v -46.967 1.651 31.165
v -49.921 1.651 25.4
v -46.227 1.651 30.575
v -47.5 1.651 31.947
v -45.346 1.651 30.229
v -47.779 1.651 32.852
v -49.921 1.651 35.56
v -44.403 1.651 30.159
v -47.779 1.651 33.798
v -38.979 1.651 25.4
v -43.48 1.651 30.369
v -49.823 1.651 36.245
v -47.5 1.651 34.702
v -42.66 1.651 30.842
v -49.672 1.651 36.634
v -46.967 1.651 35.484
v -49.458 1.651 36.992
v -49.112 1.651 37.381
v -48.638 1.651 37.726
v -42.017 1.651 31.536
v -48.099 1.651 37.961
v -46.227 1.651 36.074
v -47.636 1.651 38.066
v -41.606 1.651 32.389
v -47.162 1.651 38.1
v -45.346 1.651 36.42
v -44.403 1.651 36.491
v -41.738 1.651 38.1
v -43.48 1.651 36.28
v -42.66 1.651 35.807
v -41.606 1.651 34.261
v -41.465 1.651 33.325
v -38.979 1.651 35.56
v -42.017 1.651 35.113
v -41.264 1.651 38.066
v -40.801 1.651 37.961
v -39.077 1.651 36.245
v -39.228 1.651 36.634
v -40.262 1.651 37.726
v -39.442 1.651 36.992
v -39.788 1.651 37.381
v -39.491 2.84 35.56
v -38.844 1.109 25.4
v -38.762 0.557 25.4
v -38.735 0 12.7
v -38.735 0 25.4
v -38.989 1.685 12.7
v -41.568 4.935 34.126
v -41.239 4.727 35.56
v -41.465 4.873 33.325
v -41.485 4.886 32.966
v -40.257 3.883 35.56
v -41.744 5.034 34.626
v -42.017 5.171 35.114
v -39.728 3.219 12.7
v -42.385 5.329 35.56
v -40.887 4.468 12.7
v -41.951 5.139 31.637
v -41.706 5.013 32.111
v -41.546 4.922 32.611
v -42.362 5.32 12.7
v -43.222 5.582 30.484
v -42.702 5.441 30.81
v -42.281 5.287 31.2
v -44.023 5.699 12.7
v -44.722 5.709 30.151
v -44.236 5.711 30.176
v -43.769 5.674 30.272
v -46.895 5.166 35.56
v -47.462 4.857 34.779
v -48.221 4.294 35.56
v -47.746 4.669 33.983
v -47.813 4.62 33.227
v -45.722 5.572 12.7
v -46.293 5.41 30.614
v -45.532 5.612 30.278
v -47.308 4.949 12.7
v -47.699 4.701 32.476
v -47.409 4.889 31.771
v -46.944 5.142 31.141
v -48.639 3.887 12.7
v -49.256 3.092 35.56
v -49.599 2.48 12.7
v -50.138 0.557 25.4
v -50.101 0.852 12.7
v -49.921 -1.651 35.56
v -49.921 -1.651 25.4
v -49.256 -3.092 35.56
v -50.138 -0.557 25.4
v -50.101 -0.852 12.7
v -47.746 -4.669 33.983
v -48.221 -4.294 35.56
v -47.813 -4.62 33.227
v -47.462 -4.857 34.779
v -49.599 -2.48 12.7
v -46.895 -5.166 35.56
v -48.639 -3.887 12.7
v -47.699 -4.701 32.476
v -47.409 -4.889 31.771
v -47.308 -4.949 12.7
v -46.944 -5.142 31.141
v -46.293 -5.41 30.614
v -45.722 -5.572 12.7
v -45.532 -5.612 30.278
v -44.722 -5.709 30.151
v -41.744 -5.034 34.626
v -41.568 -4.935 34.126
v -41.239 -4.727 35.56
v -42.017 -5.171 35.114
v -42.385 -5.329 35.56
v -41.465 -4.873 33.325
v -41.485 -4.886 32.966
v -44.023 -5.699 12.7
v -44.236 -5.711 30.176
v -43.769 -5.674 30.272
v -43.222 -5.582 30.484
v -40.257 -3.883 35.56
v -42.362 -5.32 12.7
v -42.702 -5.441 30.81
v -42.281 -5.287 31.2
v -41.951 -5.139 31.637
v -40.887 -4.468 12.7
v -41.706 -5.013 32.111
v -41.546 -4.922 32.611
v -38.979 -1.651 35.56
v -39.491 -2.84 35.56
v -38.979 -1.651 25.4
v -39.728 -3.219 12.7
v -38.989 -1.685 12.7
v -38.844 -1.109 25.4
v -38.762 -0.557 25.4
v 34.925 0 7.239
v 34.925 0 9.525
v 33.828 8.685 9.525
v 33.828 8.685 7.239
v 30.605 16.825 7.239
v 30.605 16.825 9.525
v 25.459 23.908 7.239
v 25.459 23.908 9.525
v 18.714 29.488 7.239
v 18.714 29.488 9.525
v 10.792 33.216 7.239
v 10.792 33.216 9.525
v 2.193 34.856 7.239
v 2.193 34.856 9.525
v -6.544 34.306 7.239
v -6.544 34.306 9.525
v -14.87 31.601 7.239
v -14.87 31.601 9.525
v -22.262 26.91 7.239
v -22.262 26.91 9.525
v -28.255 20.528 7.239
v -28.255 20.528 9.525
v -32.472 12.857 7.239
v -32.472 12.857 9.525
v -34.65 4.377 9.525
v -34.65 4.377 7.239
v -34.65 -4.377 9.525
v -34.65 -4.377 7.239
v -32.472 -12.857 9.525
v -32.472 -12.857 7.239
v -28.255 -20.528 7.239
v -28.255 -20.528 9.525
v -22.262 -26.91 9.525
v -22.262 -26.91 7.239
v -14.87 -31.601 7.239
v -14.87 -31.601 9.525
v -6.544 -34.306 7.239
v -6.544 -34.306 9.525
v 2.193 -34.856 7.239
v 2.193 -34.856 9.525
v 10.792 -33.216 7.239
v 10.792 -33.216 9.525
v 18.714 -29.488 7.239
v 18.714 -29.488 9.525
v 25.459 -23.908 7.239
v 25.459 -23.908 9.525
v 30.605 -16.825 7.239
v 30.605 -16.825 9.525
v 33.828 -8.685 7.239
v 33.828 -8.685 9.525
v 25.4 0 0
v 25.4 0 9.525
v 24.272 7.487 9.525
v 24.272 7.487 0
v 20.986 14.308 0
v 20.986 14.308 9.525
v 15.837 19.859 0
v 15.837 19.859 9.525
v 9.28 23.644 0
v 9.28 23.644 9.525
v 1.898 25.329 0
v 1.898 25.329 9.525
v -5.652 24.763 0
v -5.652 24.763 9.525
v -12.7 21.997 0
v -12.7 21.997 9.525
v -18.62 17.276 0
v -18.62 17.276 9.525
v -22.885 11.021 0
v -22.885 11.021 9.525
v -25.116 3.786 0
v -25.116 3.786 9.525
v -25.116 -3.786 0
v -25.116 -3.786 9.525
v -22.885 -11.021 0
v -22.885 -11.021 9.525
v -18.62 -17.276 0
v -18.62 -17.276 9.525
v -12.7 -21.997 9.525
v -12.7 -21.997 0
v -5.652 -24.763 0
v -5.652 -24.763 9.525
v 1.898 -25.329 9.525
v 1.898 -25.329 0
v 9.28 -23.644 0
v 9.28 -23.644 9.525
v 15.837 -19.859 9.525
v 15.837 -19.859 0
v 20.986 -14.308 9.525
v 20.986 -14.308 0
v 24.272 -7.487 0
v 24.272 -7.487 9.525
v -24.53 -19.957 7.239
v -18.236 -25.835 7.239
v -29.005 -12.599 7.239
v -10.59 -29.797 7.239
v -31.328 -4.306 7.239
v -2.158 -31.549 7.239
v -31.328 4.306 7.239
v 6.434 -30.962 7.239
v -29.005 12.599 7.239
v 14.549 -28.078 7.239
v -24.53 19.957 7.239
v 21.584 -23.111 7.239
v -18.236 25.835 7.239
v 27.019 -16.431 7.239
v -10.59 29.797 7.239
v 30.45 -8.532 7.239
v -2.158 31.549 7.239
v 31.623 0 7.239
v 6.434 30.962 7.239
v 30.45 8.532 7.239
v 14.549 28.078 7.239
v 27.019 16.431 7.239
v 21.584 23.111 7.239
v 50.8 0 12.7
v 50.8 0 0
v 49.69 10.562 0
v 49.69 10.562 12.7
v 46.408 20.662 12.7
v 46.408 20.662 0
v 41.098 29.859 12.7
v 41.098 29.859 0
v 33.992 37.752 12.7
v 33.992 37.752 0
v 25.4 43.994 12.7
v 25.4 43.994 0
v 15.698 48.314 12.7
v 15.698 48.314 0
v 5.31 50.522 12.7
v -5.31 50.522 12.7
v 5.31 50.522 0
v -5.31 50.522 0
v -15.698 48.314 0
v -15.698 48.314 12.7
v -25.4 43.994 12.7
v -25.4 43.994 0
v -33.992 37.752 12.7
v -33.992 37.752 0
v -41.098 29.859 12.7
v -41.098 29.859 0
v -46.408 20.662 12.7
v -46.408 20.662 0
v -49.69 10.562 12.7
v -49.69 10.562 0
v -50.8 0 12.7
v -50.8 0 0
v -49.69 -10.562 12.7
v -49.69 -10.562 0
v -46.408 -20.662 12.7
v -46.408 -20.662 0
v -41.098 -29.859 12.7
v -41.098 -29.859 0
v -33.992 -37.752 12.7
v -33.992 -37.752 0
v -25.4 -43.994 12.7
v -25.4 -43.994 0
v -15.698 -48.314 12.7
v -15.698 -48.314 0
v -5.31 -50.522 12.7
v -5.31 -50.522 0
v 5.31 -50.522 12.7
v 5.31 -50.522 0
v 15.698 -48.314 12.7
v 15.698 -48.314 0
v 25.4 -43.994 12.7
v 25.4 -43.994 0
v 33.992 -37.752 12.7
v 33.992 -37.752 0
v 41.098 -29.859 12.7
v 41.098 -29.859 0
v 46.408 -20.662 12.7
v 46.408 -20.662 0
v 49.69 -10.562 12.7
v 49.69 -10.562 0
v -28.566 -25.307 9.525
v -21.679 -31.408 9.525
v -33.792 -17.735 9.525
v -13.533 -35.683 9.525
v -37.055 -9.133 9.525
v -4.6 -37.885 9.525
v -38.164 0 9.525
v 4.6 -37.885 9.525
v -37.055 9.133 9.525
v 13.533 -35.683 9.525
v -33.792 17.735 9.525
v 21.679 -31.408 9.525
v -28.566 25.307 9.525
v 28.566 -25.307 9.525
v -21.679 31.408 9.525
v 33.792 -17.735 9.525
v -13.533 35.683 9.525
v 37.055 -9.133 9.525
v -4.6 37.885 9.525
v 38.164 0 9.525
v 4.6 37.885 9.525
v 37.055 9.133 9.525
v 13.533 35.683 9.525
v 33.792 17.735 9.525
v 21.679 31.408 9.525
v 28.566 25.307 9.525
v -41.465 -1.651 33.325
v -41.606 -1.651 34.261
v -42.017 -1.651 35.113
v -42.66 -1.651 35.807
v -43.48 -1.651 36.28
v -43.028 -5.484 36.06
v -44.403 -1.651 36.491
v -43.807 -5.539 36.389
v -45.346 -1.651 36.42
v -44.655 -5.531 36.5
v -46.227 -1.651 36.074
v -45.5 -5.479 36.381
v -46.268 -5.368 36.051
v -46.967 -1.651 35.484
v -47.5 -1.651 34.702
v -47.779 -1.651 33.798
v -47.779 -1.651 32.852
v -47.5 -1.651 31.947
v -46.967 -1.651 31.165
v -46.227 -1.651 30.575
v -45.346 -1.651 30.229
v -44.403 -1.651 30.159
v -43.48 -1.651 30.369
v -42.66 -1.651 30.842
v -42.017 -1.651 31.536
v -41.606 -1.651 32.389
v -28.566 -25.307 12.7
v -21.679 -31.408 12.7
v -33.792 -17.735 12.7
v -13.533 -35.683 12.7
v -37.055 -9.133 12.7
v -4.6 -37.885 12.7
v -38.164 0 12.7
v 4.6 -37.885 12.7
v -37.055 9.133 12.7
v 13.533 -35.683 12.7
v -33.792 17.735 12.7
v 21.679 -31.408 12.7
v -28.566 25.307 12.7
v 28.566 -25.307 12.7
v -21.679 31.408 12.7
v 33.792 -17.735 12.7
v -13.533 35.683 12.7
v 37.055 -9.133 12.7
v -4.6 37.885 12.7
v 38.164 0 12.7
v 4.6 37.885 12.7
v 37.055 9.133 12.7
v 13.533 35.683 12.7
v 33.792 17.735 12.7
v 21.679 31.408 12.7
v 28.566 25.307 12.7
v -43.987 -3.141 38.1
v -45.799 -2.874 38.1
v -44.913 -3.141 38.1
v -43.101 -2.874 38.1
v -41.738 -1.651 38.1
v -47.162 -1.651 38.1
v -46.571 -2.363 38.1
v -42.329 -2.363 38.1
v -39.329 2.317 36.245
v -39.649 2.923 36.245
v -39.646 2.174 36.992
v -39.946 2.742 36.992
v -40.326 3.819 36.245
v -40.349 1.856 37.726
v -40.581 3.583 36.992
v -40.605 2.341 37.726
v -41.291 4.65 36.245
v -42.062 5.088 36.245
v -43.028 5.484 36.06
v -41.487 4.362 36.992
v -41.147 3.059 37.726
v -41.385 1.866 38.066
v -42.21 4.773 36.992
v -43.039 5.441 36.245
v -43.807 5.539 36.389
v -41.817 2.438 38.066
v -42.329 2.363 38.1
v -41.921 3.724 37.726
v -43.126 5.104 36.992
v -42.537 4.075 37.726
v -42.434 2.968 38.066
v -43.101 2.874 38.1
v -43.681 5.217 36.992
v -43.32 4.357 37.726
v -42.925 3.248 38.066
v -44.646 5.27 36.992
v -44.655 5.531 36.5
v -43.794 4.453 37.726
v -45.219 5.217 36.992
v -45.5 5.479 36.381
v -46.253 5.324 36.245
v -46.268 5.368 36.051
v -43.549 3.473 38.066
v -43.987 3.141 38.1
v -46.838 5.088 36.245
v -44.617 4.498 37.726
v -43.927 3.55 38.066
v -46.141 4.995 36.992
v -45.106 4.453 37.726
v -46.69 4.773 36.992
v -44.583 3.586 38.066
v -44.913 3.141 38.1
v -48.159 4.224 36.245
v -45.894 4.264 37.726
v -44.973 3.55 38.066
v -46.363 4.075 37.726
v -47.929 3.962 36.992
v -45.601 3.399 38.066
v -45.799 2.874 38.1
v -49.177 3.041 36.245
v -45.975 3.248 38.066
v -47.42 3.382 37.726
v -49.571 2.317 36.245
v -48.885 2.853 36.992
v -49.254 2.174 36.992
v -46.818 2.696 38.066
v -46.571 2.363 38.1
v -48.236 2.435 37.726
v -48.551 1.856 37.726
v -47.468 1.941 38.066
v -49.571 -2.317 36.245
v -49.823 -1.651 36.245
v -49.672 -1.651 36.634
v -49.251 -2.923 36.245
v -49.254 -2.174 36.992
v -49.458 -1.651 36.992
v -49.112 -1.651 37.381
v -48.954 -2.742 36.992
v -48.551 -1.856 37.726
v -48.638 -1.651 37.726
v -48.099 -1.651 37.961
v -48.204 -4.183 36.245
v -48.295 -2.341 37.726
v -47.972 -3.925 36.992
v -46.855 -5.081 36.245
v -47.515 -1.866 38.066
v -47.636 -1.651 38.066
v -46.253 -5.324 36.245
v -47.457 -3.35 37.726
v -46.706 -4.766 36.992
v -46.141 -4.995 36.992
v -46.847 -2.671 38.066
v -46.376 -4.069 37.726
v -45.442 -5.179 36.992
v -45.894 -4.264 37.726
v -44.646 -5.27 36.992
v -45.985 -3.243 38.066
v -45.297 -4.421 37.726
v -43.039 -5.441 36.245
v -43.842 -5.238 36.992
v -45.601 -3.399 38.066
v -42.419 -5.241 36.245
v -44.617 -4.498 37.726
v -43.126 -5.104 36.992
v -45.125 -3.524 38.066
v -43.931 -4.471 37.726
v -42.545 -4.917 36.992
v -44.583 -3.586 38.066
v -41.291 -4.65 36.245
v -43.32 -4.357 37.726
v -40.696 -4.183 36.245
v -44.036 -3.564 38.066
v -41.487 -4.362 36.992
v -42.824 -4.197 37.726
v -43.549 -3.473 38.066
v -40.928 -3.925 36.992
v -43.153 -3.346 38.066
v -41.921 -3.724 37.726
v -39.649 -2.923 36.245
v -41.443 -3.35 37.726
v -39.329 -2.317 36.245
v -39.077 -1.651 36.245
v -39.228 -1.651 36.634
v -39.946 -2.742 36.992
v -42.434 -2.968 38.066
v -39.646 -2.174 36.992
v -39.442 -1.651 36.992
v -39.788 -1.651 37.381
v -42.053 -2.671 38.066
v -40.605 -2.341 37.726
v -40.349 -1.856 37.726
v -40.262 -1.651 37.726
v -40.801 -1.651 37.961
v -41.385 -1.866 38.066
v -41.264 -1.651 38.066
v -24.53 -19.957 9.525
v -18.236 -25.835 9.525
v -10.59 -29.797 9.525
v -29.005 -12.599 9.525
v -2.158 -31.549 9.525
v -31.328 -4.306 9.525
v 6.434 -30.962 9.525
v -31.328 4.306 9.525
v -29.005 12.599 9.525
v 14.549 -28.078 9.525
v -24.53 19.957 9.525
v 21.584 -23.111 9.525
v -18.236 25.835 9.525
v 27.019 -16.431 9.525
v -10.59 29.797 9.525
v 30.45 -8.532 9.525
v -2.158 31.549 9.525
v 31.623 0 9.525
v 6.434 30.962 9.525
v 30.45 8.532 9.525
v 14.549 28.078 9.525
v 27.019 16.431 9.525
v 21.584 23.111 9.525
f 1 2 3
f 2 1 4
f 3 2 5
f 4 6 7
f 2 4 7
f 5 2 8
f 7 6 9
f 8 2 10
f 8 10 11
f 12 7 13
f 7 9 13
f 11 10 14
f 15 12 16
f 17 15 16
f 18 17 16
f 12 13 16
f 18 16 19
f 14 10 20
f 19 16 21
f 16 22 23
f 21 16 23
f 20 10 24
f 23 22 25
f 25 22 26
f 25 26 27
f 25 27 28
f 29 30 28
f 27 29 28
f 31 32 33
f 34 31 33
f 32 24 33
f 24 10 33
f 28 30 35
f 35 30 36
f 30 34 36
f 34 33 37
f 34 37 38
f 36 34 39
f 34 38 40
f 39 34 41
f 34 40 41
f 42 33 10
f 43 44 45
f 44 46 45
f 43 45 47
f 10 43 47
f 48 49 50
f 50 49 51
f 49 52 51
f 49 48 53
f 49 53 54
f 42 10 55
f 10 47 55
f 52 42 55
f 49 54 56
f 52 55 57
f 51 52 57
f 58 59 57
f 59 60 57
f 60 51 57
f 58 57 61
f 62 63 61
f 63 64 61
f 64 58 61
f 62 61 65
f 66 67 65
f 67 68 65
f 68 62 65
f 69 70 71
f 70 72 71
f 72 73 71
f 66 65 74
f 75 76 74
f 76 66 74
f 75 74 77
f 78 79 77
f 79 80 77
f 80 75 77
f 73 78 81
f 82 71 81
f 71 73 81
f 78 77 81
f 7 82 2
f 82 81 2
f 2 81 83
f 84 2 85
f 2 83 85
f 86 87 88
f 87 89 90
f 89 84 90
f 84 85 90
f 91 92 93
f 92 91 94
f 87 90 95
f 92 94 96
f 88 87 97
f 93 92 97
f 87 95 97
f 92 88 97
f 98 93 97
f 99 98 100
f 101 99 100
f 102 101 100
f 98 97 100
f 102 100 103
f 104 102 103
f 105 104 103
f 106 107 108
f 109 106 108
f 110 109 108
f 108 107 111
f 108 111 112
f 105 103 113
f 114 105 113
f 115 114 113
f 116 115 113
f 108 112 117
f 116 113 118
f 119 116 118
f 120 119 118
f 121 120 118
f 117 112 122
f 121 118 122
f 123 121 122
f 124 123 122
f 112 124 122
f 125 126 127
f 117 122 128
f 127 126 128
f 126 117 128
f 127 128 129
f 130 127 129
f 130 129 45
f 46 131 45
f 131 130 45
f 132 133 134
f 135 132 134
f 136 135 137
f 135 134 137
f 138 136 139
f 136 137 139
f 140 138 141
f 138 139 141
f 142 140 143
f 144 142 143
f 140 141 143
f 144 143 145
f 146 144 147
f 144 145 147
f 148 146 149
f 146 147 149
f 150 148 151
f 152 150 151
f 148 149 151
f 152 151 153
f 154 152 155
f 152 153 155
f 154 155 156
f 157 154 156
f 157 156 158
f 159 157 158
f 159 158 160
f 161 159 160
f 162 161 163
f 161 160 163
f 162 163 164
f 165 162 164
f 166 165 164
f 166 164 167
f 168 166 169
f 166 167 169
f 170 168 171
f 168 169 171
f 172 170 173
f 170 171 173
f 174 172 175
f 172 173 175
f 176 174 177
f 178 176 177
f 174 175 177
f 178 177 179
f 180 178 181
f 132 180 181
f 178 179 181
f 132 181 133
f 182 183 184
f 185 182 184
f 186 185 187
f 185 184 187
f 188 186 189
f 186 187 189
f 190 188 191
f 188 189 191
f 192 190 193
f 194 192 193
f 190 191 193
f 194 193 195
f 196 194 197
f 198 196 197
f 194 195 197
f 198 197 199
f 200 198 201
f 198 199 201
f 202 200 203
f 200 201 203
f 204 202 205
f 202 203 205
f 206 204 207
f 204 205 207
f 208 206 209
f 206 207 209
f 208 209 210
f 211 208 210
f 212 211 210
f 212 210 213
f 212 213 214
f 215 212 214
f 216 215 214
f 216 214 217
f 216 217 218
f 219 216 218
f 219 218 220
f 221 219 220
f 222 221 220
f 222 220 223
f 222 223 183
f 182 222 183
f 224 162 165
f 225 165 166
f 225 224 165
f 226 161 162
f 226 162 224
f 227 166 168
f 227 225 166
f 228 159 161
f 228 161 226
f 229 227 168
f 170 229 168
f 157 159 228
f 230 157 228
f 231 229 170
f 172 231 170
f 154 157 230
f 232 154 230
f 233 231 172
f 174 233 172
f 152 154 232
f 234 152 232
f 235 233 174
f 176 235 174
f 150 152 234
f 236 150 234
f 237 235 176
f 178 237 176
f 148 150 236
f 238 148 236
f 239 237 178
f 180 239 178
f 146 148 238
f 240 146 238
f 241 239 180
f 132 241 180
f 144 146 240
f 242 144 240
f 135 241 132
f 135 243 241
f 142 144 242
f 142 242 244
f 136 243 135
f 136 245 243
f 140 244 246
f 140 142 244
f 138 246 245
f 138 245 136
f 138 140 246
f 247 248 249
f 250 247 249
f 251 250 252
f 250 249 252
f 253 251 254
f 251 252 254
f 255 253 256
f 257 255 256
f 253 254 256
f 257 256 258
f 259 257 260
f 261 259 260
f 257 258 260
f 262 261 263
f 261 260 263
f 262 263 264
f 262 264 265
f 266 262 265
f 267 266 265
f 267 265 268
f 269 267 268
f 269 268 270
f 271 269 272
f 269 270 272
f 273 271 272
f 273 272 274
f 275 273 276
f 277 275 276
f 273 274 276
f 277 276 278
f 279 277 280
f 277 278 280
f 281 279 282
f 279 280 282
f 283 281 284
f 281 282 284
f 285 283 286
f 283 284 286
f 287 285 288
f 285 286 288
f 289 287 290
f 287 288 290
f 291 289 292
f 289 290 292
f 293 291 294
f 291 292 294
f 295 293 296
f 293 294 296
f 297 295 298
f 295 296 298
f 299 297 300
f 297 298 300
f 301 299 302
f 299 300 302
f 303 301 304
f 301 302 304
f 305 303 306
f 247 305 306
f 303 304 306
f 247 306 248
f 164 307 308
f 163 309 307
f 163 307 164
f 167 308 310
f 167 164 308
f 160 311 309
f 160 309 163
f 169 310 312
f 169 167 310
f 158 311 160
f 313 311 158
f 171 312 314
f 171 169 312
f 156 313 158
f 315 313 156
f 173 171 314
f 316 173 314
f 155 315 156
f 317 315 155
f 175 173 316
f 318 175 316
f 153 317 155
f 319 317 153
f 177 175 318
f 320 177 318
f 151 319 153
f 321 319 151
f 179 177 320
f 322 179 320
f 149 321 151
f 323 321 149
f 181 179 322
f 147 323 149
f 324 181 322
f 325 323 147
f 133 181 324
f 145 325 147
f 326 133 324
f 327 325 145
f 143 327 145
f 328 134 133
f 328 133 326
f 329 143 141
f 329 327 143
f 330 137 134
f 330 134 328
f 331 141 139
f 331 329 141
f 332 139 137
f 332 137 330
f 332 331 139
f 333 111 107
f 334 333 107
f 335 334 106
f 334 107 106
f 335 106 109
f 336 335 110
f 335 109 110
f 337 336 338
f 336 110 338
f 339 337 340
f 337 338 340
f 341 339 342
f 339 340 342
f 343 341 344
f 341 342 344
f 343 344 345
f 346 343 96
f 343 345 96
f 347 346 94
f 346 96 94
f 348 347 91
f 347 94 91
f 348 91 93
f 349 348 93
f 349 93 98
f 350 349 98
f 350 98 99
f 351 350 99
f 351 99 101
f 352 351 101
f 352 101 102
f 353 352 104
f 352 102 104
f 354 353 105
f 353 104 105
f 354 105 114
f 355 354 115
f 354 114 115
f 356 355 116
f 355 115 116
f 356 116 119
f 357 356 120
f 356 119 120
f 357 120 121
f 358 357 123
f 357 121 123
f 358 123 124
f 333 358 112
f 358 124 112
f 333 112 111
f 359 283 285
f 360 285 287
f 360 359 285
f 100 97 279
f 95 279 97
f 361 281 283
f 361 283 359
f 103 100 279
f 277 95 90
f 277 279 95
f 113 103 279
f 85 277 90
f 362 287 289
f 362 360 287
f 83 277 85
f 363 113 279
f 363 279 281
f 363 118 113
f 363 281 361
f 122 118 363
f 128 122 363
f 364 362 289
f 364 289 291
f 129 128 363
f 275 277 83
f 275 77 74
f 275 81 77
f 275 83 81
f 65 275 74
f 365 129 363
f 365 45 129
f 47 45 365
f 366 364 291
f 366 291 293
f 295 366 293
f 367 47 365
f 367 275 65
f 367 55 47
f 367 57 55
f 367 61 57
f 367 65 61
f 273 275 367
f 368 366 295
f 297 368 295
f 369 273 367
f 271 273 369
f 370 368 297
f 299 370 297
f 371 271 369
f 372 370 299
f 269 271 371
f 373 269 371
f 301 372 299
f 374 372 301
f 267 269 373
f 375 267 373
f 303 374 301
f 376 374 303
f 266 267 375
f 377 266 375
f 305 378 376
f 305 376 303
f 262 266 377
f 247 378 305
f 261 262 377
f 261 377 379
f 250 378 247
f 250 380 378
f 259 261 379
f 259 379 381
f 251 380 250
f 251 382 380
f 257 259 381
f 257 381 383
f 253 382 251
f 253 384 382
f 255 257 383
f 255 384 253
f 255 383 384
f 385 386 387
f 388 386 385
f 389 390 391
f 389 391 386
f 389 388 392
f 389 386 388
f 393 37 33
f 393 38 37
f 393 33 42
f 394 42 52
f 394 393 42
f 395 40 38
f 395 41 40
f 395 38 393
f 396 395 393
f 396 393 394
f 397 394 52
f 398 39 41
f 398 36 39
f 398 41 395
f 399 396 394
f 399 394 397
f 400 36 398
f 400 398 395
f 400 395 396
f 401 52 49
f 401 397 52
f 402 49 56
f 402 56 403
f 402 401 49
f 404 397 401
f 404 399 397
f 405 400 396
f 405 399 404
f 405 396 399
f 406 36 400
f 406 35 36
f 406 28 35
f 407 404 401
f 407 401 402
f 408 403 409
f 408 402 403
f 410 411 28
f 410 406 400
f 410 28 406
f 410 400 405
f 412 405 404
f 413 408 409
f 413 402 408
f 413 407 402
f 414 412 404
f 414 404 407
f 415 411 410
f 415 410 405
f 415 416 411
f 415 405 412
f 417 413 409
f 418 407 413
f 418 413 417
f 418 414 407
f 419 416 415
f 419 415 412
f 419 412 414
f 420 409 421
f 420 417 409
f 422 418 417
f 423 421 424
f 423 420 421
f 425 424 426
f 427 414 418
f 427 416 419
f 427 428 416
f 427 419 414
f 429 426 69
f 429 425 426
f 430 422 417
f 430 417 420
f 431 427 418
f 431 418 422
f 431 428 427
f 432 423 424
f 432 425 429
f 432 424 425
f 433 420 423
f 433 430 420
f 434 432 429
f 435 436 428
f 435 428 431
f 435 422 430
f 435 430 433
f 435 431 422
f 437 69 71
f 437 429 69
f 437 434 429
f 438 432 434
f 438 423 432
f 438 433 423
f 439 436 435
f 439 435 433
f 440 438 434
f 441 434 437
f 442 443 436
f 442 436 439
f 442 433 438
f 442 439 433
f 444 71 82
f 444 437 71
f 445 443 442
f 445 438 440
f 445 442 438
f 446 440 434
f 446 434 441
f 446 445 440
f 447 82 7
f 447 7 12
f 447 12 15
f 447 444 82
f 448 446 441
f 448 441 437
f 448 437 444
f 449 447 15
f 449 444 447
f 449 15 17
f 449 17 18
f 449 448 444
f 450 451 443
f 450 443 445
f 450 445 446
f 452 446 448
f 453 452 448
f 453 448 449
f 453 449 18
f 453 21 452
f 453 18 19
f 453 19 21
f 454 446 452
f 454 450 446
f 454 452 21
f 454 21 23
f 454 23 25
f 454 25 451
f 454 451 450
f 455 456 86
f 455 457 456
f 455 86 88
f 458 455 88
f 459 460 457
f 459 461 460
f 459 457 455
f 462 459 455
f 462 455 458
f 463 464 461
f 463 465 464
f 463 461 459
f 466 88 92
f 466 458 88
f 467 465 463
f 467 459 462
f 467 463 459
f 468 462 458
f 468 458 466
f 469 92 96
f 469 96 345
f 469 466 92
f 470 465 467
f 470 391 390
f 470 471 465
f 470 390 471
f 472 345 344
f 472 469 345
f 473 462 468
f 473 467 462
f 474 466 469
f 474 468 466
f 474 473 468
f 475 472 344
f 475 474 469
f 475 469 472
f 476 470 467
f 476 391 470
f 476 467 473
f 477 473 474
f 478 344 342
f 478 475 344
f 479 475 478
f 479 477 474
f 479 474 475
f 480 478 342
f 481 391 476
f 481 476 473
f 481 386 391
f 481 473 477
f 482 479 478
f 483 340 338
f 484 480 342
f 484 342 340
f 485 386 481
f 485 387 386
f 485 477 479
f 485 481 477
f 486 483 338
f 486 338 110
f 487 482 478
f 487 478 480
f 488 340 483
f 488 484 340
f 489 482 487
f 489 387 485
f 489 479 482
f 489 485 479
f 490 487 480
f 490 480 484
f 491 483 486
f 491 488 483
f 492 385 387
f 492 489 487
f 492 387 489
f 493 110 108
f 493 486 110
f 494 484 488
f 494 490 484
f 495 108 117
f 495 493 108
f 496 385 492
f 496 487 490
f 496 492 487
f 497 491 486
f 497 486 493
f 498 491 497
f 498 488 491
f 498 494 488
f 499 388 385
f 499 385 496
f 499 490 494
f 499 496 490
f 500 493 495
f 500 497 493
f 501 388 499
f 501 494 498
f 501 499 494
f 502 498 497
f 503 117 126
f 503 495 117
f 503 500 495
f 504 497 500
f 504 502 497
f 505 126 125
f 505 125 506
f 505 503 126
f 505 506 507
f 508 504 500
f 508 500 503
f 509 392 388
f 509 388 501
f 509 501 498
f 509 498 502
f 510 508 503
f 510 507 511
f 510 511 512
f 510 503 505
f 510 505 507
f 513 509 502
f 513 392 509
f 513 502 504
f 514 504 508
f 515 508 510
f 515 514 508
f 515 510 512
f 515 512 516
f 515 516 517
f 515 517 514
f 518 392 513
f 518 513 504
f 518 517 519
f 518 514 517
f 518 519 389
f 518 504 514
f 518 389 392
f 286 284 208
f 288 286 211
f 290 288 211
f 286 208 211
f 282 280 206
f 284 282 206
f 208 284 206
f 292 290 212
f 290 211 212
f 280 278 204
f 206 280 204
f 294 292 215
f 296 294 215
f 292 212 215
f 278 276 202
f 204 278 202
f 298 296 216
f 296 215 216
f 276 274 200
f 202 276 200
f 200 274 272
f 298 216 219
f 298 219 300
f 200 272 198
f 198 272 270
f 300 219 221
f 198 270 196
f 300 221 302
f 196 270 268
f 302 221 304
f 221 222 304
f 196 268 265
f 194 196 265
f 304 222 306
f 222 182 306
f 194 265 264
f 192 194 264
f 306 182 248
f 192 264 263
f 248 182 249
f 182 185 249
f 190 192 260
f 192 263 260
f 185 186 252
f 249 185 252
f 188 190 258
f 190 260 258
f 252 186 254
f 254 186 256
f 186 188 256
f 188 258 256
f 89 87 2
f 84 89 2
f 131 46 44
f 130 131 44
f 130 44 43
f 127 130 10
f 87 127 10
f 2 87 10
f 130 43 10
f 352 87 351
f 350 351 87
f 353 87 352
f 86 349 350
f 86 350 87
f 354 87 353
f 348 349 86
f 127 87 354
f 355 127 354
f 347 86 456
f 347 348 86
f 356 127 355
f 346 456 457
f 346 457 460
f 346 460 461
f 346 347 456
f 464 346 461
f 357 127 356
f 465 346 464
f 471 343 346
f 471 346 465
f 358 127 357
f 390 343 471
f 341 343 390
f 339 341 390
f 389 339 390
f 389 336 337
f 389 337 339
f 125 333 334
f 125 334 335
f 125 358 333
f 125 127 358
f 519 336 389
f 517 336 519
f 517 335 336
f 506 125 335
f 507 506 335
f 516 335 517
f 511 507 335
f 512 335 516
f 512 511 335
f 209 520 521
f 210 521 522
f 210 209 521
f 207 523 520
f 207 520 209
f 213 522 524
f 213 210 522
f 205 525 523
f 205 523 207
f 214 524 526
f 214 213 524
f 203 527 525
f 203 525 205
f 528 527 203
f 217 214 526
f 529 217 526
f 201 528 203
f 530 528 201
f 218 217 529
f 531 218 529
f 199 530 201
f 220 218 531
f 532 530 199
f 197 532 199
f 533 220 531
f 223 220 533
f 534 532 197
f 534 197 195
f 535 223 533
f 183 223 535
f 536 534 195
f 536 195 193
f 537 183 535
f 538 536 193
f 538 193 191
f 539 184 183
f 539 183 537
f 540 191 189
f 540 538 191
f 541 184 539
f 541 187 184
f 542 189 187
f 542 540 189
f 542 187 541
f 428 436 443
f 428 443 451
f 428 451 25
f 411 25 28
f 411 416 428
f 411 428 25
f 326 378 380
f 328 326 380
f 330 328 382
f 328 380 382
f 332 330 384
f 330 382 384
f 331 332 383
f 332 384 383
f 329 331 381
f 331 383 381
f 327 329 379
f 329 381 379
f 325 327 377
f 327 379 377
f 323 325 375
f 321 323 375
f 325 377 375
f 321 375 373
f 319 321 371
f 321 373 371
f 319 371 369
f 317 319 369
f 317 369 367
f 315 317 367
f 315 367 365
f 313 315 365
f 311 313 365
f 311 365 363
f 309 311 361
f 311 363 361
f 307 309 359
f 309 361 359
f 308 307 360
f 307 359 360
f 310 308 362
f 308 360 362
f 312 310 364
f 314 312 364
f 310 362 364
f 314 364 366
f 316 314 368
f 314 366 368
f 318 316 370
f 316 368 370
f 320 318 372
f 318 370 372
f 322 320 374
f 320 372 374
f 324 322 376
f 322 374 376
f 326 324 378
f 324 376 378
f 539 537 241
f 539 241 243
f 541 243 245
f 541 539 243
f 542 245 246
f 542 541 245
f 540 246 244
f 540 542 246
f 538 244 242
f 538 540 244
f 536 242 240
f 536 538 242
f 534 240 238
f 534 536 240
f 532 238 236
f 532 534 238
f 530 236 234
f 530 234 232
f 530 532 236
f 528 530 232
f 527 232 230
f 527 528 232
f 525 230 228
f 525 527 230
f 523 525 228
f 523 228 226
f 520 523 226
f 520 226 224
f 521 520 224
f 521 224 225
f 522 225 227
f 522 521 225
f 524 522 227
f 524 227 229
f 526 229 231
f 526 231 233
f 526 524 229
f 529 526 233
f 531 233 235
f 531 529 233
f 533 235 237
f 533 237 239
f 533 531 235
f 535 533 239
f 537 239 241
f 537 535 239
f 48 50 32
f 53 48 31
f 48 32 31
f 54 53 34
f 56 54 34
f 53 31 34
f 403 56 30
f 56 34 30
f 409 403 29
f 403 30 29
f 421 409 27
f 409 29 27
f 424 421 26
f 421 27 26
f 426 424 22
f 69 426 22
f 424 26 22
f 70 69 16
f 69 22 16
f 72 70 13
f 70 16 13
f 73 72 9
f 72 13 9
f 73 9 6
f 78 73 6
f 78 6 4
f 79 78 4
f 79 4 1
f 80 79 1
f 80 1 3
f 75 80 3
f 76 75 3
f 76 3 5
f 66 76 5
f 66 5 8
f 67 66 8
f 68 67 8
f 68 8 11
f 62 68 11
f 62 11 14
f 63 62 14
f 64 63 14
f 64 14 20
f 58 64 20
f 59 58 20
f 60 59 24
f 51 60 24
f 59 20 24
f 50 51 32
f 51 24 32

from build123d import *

# Parameters (mm, degrees)
F0_R           = 50.8
F1_DEPTH       = 12.7
F2_R           = 38.1635
F3_DEPTH       = 3.175
F4_R           = 34.925
F4_R_2         = 31.623
F5_DEPTH       = 2.286
F4_R_3         = 25.4
F6_DEPTH       = 9.526
F8_R           = 5.715
F9_DEPTH       = 25.4
F10_R          = 3.175
F11_DEPTH      = 50.801
F11_DEPTH_BACK = 25.4
F13_W          = 3.302
F13_H          = 15.8052066865
F14_DEPTH      = 50.801


# Not quite as in the source:
# - a fillet or chamfer that OpenCascade refuses, or shapes differently, is made with other operations: its cross-section is extruded or revolved along the edge and cut away or added


with BuildPart() as f1:
    # F0 (on Top) → F1 (new body)
    with BuildSketch(Plane.XY):
        Circle(F0_R)
    extrude(amount=F1_DEPTH)

    # F2 (on face) → F3 (cut)
    with BuildSketch(Plane.XY.offset(12.7)):
        Circle(F2_R)
    extrude(amount=-F3_DEPTH, mode=Mode.SUBTRACT)

    # F4 (on face) → F5 (cut)
    with BuildSketch(Plane.XY.offset(9.525)):
        Circle(F4_R)
        Circle(F4_R_2, mode=Mode.SUBTRACT)
    extrude(amount=-F5_DEPTH, mode=Mode.SUBTRACT)

    # F4 (on face) → F6 (cut, through all)
    with BuildSketch(Plane.XY.offset(9.525)):
        Circle(F4_R_3)
    extrude(amount=-F6_DEPTH, mode=Mode.SUBTRACT)

    # F8 (on offset) → F9 (join)
    with BuildSketch(Plane.XY.offset(12.7)):
        with Locations((-44.45, 0)):
            Circle(F8_R)
    extrude(amount=F9_DEPTH)

    # F10 (on Front) → F11 (cut, two sides)
    with BuildSketch(Plane.XZ) as f11_sk:
        with Locations((-44.6398891509, 33.3248)):
            Circle(F10_R)
    extrude(amount=F11_DEPTH, mode=Mode.SUBTRACT)
    extrude(f11_sk.sketch, amount=-F11_DEPTH_BACK, mode=Mode.SUBTRACT)

    # F12: fillet of radius 2.54 on 1 edges, made by hand

    # F12_s1 → F12_t2 (revolve, cut)
    with BuildSketch(Plane.XZ):
        with BuildLine():
            ThreePointArc((-38.735, 35.56), (-39.4789487758, 37.3560512242), (-41.275, 38.1))
            Line((-41.275, 38.1), (-38.735, 38.1))
            Line((-38.735, 38.1), (-38.735, 35.56))
        make_face()
    revolve(axis=Axis((-44.45, 0, 38.1), (0, 0, 1)), mode=Mode.SUBTRACT)

    # F13 (on Right) → F14 (cut, through all)
    with BuildSketch(Plane.YZ):
        with Locations((0, 33.3026033432)):
            Rectangle(F13_W, F13_H)
    extrude(amount=-F14_DEPTH, mode=Mode.SUBTRACT)


solid = f1.part
